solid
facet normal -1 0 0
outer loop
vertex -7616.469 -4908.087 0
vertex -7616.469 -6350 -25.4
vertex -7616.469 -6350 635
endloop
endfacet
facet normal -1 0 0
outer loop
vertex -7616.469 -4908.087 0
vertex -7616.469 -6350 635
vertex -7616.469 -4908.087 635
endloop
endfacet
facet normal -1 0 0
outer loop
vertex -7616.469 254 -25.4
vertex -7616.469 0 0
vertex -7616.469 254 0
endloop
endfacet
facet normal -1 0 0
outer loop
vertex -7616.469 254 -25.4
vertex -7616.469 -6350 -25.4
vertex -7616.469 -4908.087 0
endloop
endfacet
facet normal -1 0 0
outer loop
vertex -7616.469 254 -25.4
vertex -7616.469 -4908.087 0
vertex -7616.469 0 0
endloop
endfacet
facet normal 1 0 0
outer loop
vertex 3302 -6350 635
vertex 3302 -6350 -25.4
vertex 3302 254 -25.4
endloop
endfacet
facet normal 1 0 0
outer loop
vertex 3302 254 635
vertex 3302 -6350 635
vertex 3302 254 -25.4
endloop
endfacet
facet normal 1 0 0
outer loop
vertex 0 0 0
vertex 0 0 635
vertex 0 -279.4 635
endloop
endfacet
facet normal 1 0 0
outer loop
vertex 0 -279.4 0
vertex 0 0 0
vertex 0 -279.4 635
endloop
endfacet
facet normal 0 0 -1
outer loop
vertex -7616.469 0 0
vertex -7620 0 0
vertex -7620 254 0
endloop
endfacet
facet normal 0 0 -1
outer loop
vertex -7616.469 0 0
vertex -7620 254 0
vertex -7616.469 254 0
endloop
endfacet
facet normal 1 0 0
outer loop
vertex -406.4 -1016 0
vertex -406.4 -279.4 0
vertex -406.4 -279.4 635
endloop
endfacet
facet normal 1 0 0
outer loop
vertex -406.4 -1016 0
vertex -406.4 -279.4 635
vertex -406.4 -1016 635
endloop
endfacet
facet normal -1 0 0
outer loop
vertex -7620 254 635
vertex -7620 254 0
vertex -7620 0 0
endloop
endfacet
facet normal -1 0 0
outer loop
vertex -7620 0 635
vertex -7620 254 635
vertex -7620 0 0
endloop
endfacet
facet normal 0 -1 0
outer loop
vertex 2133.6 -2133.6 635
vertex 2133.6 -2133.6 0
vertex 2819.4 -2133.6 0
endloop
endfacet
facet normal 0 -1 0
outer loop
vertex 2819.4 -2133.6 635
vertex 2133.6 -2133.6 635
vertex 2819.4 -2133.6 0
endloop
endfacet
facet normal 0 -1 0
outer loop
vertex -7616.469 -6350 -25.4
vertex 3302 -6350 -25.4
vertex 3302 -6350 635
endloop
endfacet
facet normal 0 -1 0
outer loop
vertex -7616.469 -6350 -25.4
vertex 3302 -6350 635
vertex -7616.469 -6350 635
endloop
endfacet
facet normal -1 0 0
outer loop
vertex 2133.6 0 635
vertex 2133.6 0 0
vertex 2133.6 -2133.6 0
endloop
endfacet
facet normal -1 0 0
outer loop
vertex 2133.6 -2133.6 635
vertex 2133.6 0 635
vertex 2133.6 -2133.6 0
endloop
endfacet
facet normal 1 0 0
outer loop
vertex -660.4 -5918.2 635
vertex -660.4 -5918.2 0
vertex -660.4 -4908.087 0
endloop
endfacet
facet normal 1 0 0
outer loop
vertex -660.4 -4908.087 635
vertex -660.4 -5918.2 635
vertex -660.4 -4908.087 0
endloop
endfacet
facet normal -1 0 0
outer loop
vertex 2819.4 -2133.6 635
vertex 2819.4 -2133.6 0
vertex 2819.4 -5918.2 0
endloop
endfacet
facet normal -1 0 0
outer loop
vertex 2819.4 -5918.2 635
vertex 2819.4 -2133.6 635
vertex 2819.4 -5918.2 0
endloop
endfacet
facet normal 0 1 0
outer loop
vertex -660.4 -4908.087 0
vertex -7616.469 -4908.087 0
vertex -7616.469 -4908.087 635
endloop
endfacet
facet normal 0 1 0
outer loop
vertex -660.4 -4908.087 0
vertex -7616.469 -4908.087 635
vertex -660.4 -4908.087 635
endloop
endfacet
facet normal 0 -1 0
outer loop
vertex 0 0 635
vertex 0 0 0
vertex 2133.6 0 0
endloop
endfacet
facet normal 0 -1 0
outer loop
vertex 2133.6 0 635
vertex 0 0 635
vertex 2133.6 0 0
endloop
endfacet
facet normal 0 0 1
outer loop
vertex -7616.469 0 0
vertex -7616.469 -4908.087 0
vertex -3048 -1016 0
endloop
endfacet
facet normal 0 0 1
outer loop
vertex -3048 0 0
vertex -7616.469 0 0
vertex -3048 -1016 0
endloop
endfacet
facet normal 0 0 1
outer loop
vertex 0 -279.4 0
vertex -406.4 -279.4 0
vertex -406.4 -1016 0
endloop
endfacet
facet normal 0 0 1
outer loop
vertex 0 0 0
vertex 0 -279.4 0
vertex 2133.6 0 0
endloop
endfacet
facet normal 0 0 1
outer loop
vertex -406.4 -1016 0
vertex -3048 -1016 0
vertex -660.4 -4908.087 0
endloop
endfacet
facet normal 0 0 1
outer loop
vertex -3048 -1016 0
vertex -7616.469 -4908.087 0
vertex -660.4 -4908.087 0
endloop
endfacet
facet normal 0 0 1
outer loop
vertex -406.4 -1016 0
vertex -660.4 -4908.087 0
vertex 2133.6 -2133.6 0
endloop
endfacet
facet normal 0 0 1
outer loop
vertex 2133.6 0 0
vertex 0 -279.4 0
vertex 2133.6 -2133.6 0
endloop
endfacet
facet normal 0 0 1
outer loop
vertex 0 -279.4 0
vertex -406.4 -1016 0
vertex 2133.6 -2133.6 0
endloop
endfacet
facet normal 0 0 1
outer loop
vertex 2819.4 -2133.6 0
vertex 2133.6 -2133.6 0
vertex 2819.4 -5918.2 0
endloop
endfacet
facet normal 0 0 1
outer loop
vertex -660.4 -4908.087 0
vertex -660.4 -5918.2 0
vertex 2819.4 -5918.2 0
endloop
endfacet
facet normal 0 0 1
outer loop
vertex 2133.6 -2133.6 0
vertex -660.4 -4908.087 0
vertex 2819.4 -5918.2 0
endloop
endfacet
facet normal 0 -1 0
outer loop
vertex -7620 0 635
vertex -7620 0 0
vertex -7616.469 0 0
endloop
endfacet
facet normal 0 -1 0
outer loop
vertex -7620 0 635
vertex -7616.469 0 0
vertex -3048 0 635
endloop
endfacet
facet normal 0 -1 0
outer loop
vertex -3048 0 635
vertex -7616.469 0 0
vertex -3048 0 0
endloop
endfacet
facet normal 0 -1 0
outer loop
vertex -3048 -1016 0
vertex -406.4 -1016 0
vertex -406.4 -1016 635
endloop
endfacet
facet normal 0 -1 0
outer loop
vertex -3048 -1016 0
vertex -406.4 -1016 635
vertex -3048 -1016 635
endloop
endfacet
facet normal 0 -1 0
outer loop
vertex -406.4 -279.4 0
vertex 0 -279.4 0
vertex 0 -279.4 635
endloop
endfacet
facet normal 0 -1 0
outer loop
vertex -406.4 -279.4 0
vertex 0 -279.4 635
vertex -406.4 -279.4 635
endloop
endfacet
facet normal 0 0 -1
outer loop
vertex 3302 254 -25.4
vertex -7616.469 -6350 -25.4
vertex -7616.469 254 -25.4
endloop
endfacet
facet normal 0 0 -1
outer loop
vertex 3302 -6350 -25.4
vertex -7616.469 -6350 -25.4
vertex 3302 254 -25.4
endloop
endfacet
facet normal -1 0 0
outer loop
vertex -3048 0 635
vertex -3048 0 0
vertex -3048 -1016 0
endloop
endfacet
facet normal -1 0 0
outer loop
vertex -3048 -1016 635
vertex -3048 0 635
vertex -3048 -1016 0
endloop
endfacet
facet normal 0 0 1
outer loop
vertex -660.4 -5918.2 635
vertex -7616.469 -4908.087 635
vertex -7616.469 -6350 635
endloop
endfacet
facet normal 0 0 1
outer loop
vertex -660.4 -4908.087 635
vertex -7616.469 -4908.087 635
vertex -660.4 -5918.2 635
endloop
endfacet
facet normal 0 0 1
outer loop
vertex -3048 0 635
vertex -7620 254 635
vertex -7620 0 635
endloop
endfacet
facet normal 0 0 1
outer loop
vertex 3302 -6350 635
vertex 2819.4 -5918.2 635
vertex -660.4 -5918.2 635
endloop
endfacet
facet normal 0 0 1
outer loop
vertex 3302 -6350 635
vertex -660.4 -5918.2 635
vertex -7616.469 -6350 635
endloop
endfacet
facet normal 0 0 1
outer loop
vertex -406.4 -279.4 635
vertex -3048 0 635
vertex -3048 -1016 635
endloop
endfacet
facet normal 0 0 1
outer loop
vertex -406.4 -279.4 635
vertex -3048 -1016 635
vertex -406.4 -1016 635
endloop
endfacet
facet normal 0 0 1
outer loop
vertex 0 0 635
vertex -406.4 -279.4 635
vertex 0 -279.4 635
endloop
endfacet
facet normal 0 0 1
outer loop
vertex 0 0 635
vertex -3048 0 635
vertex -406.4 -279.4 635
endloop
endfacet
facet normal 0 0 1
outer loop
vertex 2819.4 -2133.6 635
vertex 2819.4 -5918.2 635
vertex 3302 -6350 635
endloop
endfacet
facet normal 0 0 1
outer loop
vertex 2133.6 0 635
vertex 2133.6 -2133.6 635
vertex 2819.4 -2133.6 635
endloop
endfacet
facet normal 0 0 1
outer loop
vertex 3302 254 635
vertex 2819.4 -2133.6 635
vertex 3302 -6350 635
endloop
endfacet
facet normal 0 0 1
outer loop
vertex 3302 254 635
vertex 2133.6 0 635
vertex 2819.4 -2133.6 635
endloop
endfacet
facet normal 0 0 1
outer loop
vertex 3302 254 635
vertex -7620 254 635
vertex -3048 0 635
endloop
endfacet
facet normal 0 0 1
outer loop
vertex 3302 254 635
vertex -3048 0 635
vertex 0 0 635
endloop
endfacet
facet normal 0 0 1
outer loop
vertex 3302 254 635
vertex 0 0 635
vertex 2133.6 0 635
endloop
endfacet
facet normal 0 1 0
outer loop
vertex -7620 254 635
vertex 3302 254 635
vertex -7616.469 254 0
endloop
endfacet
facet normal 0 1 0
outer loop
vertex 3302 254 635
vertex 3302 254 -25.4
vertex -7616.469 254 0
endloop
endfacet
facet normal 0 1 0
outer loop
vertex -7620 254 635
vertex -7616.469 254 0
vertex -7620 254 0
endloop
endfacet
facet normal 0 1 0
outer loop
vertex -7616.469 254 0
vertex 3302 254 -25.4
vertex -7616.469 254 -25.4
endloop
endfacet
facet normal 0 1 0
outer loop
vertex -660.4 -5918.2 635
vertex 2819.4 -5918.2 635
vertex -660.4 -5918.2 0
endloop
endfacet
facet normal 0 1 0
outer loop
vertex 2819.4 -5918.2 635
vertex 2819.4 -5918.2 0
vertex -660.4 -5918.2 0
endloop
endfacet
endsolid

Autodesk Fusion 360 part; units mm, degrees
sketch "Sketch1" plane through (0, 0, 0) normal (0, 0, 1) x (1, 0, 0)
  line L0 (0, 0) -> (2133.6, 0)
  line L1 (2133.6, 0) -> (2133.6, -2133.6)
  line L2 (2133.6, -2133.6) -> (2819.4, -2133.6)
  line L3 (2819.4, -2133.6) -> (2819.4, -5918.2)
  line L4 (2819.4, -5918.2) -> (-660.4, -5918.2)
  line L5 (-660.4, -5918.2) -> (-660.4, -4902.2)
  line L6 (0, 0) -> (0, -279.4)
  line L7 (0, -279.4) -> (-406.4, -279.4)
  line L8 (-660.4, -4902.2) -> (-3048, -4902.2)
  line L9 (-3048, -4902.2) -> (-3048, -3670.2305)
  line L10 (-406.4, -1016) -> (-3048, -1016)
  line L11 (-3048, -1016) -> (-3048, -3670.2305)
  line L12 (-406.4, -279.4) -> (-406.4, -1016)
  line L13 (-3048, -1016) -> (-381, -1016)
  line L14 (-381, -1016) -> (-381, 0)
  line L15 (-381, 0) -> (-3048, 0)
  line L16 (-3048, 0) -> (-3048, -1016)
  line L17 (-381, 0) -> (0, 0)
  line L18 (0, 0) -> (0, -279.4)
  line L19 (0, -279.4) -> (-381, -279.4)
  line L20 (-381, -279.4) -> (-381, 0)
  line L21 (-3048, 0) -> (3302, 0)
  line L22 (3302, 0) -> (3302, 254)
  line L23 (3302, 254) -> (-3048, 254)
  line L24 (-3048, 254) -> (-3048, 0)
  line L25 (2133.6, 0) -> (3302, 0)
  line L26 (3302, 0) -> (3302, -2133.6)
  line L27 (3302, -2133.6) -> (2133.6, -2133.6)
  line L28 (2133.6, -2133.6) -> (2133.6, 0)
  line L29 (2819.4, -2133.6) -> (3302, -2133.6)
  line L30 (3302, -2133.6) -> (3302, -6349.9999)
  line L31 (3302, -6349.9999) -> (2819.4, -6349.9999)
  line L32 (2819.4, -6349.9999) -> (2819.4, -2133.6)
  line L33 (2819.4, -6349.9999) -> (-7616.4691, -6349.9999)
  line L34 (-7616.4691, -6349.9999) -> (-7616.4691, -5918.2)
  line L35 (-7616.4691, -5918.2) -> (2819.4, -5918.2)
  line L36 (2819.4, -5918.2) -> (2819.4, -6349.9999)
  line L37 (-660.4, -5918.2) -> (-7616.4691, -5918.2)
  line L38 (-7616.4691, -5918.2) -> (-7616.4691, -4908.0872)
  line L39 (-7616.4691, -4908.0872) -> (-660.4, -4908.0872)
  line L40 (-660.4, -4908.0872) -> (-660.4, -5918.2)
  line L41 (-3048, 254) -> (-7619.9999, 254)
  line L42 (-7619.9999, 254) -> (-7619.9999, 0)
  line L43 (-7619.9999, 0) -> (-3048, 0)
  line L44 (-3048, 0) -> (-3048, 254)
  line L45 (-7619.9999, 0) -> (-3048, 0)
  line L46 (-3048, 0) -> (-3048, -4902.2)
  line L47 (-3048, -4902.2) -> (-7619.9999, -4902.2)
  line L48 (-7619.9999, -4902.2) -> (-7619.9999, 0)
extrude "Extrude1" add sketch "Sketch1" along normal blind 635 contours L0 L15 L17 L21 L22 L23 L24 L25 L44 | L1 L2 L21 L25 L26 L27 L28 L29 | L24 L41 L42 L43 L44 L45 | L3 L27 L29 L30 L31 L32 L36 | L4 L32 L33 L34 L35 L36 L37 | L5 L35 L37 L38 L39 L40
sketch "Sketch2" plane through (0, 0, 0) normal (0, 0, -1) x (1, 0, 0)
  line L0 (-7619.9999, -254) -> (3302, -254)
  line L1 (3302, -254) -> (3302, 6349.9999)
  line L2 (3302, 6349.9999) -> (-7616.4691, 6349.9999)
  line L3 (-7616.4691, 6349.9999) -> (-7616.4691, 4908.0872)
  line L4 (-7616.4691, 4908.0872) -> (-660.4, 4908.0872)
  line L5 (-660.4, 4908.0872) -> (-660.4, 5918.2)
  line L6 (-660.4, 5918.2) -> (2819.4, 5918.2)
  line L7 (2819.4, 5918.2) -> (2819.4, 2133.6)
  line L8 (2819.4, 2133.6) -> (2133.6, 2133.6)
  line L9 (2133.6, 2133.6) -> (2133.6, 0)
  line L10 (2133.6, 0) -> (-7619.9999, 0)
  line L11 (-7619.9999, 0) -> (-7619.9999, -254)
  line L12 (3302, -254) -> (-7616.4691, -254)
  line L13 (-7616.4691, -254) -> (-7616.4691, 6349.9999)
  line L14 (-7616.4691, 6349.9999) -> (3302, 6349.9999)
  line L15 (3302, 6349.9999) -> (3302, -254)
extrude "Extrude2" add sketch "Sketch2" along normal blind 25.4 contours L0 L1 L2 L3 L4 L5 L6 L7 L8 L9 L10 L12 L13 L14 L15 | L4 L5 L6 L7 L8 L9 L10 L13
extrude "Extrude3" add sketch "Sketch1" along normal blind 635 contours L6 L7 L14 L17 L18 L19 L20 L21 | L7 L10 L12 L13 L14 L15 L16 L20 L21 L46
sketch "Sketch3" plane through (0, 0, 0) normal (0, 0, 1) x (1, 0, 0)
  circle A0 centre (-5079.9999, 2540) radius 660.4
  circle A1 centre (-5079.9999, 2540) radius 965.2
  line L0 (-6349.9999, 2844.8) -> (-3809.9999, 2844.8)
  line L1 (-3809.9999, 2844.8) -> (-3809.9999, 2235.2)
  line L2 (-3809.9999, 2235.2) -> (-6349.9999, 2235.2)
  line L3 (-6349.9999, 2235.2) -> (-6349.9999, 2844.8)
  line L4 (-6349.9999, 2844.8) -> (-3809.9999, 2235.2) construction
  line L5 (-3809.9999, 2844.8) -> (-6349.9999, 2235.2) construction
  line L6 (-4775.1999, 3810) -> (-5384.7999, 3810)
  line L7 (-5384.7999, 3810) -> (-5384.7999, 1270)
  line L8 (-5384.7999, 1270) -> (-4775.1999, 1270)
  line L9 (-4775.1999, 1270) -> (-4775.1999, 3810)
  line L10 (-4775.1999, 3810) -> (-5384.7999, 1270) construction
  line L11 (-5384.7999, 3810) -> (-4775.1999, 1270) construction
  line L12 (-6349.9999, 2235.2) -> (-3845.6793, 2235.2)
  line L13 (-3845.6793, 2235.2) -> (-3845.6793, 2133.6)
  line L14 (-3845.6793, 2133.6) -> (-6349.9999, 2133.6)
  line L15 (-6349.9999, 2133.6) -> (-6349.9999, 2235.2)
  line L16 (-6349.9999, 2844.8) -> (-3809.9999, 2844.8)
  line L17 (-3809.9999, 2844.8) -> (-3809.9999, 2946.4)
  line L18 (-3809.9999, 2946.4) -> (-6349.9999, 2946.4)
  line L19 (-6349.9999, 2946.4) -> (-6349.9999, 2844.8)
  line L20 (-5384.7999, 3810) -> (-5486.3999, 3810)
  line L21 (-5486.3999, 3810) -> (-5486.3999, 1270)
  line L22 (-5486.3999, 1270) -> (-5384.7999, 1270)
  line L23 (-5384.7999, 1270) -> (-5384.7999, 3810)
  line L24 (-4775.1999, 1270) -> (-4673.5999, 1270)
  line L25 (-4673.5999, 1270) -> (-4673.5999, 3809.9999)
  line L26 (-4673.5999, 3809.9999) -> (-4775.1999, 3809.9999)
  line L27 (-4775.1999, 3809.9999) -> (-4775.1999, 1270)
  circle A2 centre (-5079.9999, 2540) radius 558.8
  circle A3 centre (-5079.9999, 2540) radius 1117.6
  point P0 (-5079.9999, 2540)
  point P1 (-5079.9999, 2540)
  dimension "d17" = 1320.8
  dimension "d18" = 1930.4
  dimension "d19" = 2540
  dimension "d20" = 609.6
  dimension "d21" = 609.6
  dimension "d22" = 2540
  dimension "d23" = 101.6
  dimension "d24" = 101.6
  dimension "d25" = 101.6
  dimension "d26" = 101.6
  dimension "d27" = 1117.6
  dimension "d28" = 2235.2
sketch "Sketch4" plane through (0, 0, 0) normal (0, 0, 1) x (1, 0, 0)
  circle A0 centre (-662.532, 1929.7788) radius 660.4
  circle A1 centre (-662.532, 1929.7788) radius 1270
  circle A2 centre (-662.532, 1929.7788) radius 558.8
  circle A3 centre (-662.532, 1929.7788) radius 1371.6
  line L0 (-662.532, 1929.7788) -> (-2034.132, 1929.7788)
  line L1 (-662.532, 1929.7788) -> (-1632.3996, 959.9111)
  dimension "d33" = 1320.8
  dimension "d34" = 2540
  dimension "d35" = 1117.6
  dimension "d36" = 2743.2
  dimension "d37" = 135
sketch "Sketch7" plane through (0, 0, 0) normal (0, 0, 1) x (1, 0, 0)
  circle A0 centre (-662.532, 1929.7788) radius 660.4
  circle A1 centre (-662.532, 1929.7788) radius 558.8
  circle A2 centre (-662.532, 1929.7788) radius 1270
  circle A3 centre (-662.532, 1929.7788) radius 1371.6
  line L0 (-662.532, 1929.7788) -> (-2034.132, 1929.7788)
  line L1 (-662.532, 1929.7788) -> (-662.532, 3301.3788)
  dimension "d42" = 1320.8
  dimension "d43" = 2540
  dimension "d44" = 1117.6
  dimension "d45" = 2743.2
component "52 dia 45" placed x (1, 0, 0) y (0, 1, 0) z (0, 0, 1) at (-651.3455, 1373.3394, 2024.6849)
component "52 dia 90" placed x (1, 0, 0) y (0, 1, 0) z (0, 0, 1) at (0, 0, 0)
